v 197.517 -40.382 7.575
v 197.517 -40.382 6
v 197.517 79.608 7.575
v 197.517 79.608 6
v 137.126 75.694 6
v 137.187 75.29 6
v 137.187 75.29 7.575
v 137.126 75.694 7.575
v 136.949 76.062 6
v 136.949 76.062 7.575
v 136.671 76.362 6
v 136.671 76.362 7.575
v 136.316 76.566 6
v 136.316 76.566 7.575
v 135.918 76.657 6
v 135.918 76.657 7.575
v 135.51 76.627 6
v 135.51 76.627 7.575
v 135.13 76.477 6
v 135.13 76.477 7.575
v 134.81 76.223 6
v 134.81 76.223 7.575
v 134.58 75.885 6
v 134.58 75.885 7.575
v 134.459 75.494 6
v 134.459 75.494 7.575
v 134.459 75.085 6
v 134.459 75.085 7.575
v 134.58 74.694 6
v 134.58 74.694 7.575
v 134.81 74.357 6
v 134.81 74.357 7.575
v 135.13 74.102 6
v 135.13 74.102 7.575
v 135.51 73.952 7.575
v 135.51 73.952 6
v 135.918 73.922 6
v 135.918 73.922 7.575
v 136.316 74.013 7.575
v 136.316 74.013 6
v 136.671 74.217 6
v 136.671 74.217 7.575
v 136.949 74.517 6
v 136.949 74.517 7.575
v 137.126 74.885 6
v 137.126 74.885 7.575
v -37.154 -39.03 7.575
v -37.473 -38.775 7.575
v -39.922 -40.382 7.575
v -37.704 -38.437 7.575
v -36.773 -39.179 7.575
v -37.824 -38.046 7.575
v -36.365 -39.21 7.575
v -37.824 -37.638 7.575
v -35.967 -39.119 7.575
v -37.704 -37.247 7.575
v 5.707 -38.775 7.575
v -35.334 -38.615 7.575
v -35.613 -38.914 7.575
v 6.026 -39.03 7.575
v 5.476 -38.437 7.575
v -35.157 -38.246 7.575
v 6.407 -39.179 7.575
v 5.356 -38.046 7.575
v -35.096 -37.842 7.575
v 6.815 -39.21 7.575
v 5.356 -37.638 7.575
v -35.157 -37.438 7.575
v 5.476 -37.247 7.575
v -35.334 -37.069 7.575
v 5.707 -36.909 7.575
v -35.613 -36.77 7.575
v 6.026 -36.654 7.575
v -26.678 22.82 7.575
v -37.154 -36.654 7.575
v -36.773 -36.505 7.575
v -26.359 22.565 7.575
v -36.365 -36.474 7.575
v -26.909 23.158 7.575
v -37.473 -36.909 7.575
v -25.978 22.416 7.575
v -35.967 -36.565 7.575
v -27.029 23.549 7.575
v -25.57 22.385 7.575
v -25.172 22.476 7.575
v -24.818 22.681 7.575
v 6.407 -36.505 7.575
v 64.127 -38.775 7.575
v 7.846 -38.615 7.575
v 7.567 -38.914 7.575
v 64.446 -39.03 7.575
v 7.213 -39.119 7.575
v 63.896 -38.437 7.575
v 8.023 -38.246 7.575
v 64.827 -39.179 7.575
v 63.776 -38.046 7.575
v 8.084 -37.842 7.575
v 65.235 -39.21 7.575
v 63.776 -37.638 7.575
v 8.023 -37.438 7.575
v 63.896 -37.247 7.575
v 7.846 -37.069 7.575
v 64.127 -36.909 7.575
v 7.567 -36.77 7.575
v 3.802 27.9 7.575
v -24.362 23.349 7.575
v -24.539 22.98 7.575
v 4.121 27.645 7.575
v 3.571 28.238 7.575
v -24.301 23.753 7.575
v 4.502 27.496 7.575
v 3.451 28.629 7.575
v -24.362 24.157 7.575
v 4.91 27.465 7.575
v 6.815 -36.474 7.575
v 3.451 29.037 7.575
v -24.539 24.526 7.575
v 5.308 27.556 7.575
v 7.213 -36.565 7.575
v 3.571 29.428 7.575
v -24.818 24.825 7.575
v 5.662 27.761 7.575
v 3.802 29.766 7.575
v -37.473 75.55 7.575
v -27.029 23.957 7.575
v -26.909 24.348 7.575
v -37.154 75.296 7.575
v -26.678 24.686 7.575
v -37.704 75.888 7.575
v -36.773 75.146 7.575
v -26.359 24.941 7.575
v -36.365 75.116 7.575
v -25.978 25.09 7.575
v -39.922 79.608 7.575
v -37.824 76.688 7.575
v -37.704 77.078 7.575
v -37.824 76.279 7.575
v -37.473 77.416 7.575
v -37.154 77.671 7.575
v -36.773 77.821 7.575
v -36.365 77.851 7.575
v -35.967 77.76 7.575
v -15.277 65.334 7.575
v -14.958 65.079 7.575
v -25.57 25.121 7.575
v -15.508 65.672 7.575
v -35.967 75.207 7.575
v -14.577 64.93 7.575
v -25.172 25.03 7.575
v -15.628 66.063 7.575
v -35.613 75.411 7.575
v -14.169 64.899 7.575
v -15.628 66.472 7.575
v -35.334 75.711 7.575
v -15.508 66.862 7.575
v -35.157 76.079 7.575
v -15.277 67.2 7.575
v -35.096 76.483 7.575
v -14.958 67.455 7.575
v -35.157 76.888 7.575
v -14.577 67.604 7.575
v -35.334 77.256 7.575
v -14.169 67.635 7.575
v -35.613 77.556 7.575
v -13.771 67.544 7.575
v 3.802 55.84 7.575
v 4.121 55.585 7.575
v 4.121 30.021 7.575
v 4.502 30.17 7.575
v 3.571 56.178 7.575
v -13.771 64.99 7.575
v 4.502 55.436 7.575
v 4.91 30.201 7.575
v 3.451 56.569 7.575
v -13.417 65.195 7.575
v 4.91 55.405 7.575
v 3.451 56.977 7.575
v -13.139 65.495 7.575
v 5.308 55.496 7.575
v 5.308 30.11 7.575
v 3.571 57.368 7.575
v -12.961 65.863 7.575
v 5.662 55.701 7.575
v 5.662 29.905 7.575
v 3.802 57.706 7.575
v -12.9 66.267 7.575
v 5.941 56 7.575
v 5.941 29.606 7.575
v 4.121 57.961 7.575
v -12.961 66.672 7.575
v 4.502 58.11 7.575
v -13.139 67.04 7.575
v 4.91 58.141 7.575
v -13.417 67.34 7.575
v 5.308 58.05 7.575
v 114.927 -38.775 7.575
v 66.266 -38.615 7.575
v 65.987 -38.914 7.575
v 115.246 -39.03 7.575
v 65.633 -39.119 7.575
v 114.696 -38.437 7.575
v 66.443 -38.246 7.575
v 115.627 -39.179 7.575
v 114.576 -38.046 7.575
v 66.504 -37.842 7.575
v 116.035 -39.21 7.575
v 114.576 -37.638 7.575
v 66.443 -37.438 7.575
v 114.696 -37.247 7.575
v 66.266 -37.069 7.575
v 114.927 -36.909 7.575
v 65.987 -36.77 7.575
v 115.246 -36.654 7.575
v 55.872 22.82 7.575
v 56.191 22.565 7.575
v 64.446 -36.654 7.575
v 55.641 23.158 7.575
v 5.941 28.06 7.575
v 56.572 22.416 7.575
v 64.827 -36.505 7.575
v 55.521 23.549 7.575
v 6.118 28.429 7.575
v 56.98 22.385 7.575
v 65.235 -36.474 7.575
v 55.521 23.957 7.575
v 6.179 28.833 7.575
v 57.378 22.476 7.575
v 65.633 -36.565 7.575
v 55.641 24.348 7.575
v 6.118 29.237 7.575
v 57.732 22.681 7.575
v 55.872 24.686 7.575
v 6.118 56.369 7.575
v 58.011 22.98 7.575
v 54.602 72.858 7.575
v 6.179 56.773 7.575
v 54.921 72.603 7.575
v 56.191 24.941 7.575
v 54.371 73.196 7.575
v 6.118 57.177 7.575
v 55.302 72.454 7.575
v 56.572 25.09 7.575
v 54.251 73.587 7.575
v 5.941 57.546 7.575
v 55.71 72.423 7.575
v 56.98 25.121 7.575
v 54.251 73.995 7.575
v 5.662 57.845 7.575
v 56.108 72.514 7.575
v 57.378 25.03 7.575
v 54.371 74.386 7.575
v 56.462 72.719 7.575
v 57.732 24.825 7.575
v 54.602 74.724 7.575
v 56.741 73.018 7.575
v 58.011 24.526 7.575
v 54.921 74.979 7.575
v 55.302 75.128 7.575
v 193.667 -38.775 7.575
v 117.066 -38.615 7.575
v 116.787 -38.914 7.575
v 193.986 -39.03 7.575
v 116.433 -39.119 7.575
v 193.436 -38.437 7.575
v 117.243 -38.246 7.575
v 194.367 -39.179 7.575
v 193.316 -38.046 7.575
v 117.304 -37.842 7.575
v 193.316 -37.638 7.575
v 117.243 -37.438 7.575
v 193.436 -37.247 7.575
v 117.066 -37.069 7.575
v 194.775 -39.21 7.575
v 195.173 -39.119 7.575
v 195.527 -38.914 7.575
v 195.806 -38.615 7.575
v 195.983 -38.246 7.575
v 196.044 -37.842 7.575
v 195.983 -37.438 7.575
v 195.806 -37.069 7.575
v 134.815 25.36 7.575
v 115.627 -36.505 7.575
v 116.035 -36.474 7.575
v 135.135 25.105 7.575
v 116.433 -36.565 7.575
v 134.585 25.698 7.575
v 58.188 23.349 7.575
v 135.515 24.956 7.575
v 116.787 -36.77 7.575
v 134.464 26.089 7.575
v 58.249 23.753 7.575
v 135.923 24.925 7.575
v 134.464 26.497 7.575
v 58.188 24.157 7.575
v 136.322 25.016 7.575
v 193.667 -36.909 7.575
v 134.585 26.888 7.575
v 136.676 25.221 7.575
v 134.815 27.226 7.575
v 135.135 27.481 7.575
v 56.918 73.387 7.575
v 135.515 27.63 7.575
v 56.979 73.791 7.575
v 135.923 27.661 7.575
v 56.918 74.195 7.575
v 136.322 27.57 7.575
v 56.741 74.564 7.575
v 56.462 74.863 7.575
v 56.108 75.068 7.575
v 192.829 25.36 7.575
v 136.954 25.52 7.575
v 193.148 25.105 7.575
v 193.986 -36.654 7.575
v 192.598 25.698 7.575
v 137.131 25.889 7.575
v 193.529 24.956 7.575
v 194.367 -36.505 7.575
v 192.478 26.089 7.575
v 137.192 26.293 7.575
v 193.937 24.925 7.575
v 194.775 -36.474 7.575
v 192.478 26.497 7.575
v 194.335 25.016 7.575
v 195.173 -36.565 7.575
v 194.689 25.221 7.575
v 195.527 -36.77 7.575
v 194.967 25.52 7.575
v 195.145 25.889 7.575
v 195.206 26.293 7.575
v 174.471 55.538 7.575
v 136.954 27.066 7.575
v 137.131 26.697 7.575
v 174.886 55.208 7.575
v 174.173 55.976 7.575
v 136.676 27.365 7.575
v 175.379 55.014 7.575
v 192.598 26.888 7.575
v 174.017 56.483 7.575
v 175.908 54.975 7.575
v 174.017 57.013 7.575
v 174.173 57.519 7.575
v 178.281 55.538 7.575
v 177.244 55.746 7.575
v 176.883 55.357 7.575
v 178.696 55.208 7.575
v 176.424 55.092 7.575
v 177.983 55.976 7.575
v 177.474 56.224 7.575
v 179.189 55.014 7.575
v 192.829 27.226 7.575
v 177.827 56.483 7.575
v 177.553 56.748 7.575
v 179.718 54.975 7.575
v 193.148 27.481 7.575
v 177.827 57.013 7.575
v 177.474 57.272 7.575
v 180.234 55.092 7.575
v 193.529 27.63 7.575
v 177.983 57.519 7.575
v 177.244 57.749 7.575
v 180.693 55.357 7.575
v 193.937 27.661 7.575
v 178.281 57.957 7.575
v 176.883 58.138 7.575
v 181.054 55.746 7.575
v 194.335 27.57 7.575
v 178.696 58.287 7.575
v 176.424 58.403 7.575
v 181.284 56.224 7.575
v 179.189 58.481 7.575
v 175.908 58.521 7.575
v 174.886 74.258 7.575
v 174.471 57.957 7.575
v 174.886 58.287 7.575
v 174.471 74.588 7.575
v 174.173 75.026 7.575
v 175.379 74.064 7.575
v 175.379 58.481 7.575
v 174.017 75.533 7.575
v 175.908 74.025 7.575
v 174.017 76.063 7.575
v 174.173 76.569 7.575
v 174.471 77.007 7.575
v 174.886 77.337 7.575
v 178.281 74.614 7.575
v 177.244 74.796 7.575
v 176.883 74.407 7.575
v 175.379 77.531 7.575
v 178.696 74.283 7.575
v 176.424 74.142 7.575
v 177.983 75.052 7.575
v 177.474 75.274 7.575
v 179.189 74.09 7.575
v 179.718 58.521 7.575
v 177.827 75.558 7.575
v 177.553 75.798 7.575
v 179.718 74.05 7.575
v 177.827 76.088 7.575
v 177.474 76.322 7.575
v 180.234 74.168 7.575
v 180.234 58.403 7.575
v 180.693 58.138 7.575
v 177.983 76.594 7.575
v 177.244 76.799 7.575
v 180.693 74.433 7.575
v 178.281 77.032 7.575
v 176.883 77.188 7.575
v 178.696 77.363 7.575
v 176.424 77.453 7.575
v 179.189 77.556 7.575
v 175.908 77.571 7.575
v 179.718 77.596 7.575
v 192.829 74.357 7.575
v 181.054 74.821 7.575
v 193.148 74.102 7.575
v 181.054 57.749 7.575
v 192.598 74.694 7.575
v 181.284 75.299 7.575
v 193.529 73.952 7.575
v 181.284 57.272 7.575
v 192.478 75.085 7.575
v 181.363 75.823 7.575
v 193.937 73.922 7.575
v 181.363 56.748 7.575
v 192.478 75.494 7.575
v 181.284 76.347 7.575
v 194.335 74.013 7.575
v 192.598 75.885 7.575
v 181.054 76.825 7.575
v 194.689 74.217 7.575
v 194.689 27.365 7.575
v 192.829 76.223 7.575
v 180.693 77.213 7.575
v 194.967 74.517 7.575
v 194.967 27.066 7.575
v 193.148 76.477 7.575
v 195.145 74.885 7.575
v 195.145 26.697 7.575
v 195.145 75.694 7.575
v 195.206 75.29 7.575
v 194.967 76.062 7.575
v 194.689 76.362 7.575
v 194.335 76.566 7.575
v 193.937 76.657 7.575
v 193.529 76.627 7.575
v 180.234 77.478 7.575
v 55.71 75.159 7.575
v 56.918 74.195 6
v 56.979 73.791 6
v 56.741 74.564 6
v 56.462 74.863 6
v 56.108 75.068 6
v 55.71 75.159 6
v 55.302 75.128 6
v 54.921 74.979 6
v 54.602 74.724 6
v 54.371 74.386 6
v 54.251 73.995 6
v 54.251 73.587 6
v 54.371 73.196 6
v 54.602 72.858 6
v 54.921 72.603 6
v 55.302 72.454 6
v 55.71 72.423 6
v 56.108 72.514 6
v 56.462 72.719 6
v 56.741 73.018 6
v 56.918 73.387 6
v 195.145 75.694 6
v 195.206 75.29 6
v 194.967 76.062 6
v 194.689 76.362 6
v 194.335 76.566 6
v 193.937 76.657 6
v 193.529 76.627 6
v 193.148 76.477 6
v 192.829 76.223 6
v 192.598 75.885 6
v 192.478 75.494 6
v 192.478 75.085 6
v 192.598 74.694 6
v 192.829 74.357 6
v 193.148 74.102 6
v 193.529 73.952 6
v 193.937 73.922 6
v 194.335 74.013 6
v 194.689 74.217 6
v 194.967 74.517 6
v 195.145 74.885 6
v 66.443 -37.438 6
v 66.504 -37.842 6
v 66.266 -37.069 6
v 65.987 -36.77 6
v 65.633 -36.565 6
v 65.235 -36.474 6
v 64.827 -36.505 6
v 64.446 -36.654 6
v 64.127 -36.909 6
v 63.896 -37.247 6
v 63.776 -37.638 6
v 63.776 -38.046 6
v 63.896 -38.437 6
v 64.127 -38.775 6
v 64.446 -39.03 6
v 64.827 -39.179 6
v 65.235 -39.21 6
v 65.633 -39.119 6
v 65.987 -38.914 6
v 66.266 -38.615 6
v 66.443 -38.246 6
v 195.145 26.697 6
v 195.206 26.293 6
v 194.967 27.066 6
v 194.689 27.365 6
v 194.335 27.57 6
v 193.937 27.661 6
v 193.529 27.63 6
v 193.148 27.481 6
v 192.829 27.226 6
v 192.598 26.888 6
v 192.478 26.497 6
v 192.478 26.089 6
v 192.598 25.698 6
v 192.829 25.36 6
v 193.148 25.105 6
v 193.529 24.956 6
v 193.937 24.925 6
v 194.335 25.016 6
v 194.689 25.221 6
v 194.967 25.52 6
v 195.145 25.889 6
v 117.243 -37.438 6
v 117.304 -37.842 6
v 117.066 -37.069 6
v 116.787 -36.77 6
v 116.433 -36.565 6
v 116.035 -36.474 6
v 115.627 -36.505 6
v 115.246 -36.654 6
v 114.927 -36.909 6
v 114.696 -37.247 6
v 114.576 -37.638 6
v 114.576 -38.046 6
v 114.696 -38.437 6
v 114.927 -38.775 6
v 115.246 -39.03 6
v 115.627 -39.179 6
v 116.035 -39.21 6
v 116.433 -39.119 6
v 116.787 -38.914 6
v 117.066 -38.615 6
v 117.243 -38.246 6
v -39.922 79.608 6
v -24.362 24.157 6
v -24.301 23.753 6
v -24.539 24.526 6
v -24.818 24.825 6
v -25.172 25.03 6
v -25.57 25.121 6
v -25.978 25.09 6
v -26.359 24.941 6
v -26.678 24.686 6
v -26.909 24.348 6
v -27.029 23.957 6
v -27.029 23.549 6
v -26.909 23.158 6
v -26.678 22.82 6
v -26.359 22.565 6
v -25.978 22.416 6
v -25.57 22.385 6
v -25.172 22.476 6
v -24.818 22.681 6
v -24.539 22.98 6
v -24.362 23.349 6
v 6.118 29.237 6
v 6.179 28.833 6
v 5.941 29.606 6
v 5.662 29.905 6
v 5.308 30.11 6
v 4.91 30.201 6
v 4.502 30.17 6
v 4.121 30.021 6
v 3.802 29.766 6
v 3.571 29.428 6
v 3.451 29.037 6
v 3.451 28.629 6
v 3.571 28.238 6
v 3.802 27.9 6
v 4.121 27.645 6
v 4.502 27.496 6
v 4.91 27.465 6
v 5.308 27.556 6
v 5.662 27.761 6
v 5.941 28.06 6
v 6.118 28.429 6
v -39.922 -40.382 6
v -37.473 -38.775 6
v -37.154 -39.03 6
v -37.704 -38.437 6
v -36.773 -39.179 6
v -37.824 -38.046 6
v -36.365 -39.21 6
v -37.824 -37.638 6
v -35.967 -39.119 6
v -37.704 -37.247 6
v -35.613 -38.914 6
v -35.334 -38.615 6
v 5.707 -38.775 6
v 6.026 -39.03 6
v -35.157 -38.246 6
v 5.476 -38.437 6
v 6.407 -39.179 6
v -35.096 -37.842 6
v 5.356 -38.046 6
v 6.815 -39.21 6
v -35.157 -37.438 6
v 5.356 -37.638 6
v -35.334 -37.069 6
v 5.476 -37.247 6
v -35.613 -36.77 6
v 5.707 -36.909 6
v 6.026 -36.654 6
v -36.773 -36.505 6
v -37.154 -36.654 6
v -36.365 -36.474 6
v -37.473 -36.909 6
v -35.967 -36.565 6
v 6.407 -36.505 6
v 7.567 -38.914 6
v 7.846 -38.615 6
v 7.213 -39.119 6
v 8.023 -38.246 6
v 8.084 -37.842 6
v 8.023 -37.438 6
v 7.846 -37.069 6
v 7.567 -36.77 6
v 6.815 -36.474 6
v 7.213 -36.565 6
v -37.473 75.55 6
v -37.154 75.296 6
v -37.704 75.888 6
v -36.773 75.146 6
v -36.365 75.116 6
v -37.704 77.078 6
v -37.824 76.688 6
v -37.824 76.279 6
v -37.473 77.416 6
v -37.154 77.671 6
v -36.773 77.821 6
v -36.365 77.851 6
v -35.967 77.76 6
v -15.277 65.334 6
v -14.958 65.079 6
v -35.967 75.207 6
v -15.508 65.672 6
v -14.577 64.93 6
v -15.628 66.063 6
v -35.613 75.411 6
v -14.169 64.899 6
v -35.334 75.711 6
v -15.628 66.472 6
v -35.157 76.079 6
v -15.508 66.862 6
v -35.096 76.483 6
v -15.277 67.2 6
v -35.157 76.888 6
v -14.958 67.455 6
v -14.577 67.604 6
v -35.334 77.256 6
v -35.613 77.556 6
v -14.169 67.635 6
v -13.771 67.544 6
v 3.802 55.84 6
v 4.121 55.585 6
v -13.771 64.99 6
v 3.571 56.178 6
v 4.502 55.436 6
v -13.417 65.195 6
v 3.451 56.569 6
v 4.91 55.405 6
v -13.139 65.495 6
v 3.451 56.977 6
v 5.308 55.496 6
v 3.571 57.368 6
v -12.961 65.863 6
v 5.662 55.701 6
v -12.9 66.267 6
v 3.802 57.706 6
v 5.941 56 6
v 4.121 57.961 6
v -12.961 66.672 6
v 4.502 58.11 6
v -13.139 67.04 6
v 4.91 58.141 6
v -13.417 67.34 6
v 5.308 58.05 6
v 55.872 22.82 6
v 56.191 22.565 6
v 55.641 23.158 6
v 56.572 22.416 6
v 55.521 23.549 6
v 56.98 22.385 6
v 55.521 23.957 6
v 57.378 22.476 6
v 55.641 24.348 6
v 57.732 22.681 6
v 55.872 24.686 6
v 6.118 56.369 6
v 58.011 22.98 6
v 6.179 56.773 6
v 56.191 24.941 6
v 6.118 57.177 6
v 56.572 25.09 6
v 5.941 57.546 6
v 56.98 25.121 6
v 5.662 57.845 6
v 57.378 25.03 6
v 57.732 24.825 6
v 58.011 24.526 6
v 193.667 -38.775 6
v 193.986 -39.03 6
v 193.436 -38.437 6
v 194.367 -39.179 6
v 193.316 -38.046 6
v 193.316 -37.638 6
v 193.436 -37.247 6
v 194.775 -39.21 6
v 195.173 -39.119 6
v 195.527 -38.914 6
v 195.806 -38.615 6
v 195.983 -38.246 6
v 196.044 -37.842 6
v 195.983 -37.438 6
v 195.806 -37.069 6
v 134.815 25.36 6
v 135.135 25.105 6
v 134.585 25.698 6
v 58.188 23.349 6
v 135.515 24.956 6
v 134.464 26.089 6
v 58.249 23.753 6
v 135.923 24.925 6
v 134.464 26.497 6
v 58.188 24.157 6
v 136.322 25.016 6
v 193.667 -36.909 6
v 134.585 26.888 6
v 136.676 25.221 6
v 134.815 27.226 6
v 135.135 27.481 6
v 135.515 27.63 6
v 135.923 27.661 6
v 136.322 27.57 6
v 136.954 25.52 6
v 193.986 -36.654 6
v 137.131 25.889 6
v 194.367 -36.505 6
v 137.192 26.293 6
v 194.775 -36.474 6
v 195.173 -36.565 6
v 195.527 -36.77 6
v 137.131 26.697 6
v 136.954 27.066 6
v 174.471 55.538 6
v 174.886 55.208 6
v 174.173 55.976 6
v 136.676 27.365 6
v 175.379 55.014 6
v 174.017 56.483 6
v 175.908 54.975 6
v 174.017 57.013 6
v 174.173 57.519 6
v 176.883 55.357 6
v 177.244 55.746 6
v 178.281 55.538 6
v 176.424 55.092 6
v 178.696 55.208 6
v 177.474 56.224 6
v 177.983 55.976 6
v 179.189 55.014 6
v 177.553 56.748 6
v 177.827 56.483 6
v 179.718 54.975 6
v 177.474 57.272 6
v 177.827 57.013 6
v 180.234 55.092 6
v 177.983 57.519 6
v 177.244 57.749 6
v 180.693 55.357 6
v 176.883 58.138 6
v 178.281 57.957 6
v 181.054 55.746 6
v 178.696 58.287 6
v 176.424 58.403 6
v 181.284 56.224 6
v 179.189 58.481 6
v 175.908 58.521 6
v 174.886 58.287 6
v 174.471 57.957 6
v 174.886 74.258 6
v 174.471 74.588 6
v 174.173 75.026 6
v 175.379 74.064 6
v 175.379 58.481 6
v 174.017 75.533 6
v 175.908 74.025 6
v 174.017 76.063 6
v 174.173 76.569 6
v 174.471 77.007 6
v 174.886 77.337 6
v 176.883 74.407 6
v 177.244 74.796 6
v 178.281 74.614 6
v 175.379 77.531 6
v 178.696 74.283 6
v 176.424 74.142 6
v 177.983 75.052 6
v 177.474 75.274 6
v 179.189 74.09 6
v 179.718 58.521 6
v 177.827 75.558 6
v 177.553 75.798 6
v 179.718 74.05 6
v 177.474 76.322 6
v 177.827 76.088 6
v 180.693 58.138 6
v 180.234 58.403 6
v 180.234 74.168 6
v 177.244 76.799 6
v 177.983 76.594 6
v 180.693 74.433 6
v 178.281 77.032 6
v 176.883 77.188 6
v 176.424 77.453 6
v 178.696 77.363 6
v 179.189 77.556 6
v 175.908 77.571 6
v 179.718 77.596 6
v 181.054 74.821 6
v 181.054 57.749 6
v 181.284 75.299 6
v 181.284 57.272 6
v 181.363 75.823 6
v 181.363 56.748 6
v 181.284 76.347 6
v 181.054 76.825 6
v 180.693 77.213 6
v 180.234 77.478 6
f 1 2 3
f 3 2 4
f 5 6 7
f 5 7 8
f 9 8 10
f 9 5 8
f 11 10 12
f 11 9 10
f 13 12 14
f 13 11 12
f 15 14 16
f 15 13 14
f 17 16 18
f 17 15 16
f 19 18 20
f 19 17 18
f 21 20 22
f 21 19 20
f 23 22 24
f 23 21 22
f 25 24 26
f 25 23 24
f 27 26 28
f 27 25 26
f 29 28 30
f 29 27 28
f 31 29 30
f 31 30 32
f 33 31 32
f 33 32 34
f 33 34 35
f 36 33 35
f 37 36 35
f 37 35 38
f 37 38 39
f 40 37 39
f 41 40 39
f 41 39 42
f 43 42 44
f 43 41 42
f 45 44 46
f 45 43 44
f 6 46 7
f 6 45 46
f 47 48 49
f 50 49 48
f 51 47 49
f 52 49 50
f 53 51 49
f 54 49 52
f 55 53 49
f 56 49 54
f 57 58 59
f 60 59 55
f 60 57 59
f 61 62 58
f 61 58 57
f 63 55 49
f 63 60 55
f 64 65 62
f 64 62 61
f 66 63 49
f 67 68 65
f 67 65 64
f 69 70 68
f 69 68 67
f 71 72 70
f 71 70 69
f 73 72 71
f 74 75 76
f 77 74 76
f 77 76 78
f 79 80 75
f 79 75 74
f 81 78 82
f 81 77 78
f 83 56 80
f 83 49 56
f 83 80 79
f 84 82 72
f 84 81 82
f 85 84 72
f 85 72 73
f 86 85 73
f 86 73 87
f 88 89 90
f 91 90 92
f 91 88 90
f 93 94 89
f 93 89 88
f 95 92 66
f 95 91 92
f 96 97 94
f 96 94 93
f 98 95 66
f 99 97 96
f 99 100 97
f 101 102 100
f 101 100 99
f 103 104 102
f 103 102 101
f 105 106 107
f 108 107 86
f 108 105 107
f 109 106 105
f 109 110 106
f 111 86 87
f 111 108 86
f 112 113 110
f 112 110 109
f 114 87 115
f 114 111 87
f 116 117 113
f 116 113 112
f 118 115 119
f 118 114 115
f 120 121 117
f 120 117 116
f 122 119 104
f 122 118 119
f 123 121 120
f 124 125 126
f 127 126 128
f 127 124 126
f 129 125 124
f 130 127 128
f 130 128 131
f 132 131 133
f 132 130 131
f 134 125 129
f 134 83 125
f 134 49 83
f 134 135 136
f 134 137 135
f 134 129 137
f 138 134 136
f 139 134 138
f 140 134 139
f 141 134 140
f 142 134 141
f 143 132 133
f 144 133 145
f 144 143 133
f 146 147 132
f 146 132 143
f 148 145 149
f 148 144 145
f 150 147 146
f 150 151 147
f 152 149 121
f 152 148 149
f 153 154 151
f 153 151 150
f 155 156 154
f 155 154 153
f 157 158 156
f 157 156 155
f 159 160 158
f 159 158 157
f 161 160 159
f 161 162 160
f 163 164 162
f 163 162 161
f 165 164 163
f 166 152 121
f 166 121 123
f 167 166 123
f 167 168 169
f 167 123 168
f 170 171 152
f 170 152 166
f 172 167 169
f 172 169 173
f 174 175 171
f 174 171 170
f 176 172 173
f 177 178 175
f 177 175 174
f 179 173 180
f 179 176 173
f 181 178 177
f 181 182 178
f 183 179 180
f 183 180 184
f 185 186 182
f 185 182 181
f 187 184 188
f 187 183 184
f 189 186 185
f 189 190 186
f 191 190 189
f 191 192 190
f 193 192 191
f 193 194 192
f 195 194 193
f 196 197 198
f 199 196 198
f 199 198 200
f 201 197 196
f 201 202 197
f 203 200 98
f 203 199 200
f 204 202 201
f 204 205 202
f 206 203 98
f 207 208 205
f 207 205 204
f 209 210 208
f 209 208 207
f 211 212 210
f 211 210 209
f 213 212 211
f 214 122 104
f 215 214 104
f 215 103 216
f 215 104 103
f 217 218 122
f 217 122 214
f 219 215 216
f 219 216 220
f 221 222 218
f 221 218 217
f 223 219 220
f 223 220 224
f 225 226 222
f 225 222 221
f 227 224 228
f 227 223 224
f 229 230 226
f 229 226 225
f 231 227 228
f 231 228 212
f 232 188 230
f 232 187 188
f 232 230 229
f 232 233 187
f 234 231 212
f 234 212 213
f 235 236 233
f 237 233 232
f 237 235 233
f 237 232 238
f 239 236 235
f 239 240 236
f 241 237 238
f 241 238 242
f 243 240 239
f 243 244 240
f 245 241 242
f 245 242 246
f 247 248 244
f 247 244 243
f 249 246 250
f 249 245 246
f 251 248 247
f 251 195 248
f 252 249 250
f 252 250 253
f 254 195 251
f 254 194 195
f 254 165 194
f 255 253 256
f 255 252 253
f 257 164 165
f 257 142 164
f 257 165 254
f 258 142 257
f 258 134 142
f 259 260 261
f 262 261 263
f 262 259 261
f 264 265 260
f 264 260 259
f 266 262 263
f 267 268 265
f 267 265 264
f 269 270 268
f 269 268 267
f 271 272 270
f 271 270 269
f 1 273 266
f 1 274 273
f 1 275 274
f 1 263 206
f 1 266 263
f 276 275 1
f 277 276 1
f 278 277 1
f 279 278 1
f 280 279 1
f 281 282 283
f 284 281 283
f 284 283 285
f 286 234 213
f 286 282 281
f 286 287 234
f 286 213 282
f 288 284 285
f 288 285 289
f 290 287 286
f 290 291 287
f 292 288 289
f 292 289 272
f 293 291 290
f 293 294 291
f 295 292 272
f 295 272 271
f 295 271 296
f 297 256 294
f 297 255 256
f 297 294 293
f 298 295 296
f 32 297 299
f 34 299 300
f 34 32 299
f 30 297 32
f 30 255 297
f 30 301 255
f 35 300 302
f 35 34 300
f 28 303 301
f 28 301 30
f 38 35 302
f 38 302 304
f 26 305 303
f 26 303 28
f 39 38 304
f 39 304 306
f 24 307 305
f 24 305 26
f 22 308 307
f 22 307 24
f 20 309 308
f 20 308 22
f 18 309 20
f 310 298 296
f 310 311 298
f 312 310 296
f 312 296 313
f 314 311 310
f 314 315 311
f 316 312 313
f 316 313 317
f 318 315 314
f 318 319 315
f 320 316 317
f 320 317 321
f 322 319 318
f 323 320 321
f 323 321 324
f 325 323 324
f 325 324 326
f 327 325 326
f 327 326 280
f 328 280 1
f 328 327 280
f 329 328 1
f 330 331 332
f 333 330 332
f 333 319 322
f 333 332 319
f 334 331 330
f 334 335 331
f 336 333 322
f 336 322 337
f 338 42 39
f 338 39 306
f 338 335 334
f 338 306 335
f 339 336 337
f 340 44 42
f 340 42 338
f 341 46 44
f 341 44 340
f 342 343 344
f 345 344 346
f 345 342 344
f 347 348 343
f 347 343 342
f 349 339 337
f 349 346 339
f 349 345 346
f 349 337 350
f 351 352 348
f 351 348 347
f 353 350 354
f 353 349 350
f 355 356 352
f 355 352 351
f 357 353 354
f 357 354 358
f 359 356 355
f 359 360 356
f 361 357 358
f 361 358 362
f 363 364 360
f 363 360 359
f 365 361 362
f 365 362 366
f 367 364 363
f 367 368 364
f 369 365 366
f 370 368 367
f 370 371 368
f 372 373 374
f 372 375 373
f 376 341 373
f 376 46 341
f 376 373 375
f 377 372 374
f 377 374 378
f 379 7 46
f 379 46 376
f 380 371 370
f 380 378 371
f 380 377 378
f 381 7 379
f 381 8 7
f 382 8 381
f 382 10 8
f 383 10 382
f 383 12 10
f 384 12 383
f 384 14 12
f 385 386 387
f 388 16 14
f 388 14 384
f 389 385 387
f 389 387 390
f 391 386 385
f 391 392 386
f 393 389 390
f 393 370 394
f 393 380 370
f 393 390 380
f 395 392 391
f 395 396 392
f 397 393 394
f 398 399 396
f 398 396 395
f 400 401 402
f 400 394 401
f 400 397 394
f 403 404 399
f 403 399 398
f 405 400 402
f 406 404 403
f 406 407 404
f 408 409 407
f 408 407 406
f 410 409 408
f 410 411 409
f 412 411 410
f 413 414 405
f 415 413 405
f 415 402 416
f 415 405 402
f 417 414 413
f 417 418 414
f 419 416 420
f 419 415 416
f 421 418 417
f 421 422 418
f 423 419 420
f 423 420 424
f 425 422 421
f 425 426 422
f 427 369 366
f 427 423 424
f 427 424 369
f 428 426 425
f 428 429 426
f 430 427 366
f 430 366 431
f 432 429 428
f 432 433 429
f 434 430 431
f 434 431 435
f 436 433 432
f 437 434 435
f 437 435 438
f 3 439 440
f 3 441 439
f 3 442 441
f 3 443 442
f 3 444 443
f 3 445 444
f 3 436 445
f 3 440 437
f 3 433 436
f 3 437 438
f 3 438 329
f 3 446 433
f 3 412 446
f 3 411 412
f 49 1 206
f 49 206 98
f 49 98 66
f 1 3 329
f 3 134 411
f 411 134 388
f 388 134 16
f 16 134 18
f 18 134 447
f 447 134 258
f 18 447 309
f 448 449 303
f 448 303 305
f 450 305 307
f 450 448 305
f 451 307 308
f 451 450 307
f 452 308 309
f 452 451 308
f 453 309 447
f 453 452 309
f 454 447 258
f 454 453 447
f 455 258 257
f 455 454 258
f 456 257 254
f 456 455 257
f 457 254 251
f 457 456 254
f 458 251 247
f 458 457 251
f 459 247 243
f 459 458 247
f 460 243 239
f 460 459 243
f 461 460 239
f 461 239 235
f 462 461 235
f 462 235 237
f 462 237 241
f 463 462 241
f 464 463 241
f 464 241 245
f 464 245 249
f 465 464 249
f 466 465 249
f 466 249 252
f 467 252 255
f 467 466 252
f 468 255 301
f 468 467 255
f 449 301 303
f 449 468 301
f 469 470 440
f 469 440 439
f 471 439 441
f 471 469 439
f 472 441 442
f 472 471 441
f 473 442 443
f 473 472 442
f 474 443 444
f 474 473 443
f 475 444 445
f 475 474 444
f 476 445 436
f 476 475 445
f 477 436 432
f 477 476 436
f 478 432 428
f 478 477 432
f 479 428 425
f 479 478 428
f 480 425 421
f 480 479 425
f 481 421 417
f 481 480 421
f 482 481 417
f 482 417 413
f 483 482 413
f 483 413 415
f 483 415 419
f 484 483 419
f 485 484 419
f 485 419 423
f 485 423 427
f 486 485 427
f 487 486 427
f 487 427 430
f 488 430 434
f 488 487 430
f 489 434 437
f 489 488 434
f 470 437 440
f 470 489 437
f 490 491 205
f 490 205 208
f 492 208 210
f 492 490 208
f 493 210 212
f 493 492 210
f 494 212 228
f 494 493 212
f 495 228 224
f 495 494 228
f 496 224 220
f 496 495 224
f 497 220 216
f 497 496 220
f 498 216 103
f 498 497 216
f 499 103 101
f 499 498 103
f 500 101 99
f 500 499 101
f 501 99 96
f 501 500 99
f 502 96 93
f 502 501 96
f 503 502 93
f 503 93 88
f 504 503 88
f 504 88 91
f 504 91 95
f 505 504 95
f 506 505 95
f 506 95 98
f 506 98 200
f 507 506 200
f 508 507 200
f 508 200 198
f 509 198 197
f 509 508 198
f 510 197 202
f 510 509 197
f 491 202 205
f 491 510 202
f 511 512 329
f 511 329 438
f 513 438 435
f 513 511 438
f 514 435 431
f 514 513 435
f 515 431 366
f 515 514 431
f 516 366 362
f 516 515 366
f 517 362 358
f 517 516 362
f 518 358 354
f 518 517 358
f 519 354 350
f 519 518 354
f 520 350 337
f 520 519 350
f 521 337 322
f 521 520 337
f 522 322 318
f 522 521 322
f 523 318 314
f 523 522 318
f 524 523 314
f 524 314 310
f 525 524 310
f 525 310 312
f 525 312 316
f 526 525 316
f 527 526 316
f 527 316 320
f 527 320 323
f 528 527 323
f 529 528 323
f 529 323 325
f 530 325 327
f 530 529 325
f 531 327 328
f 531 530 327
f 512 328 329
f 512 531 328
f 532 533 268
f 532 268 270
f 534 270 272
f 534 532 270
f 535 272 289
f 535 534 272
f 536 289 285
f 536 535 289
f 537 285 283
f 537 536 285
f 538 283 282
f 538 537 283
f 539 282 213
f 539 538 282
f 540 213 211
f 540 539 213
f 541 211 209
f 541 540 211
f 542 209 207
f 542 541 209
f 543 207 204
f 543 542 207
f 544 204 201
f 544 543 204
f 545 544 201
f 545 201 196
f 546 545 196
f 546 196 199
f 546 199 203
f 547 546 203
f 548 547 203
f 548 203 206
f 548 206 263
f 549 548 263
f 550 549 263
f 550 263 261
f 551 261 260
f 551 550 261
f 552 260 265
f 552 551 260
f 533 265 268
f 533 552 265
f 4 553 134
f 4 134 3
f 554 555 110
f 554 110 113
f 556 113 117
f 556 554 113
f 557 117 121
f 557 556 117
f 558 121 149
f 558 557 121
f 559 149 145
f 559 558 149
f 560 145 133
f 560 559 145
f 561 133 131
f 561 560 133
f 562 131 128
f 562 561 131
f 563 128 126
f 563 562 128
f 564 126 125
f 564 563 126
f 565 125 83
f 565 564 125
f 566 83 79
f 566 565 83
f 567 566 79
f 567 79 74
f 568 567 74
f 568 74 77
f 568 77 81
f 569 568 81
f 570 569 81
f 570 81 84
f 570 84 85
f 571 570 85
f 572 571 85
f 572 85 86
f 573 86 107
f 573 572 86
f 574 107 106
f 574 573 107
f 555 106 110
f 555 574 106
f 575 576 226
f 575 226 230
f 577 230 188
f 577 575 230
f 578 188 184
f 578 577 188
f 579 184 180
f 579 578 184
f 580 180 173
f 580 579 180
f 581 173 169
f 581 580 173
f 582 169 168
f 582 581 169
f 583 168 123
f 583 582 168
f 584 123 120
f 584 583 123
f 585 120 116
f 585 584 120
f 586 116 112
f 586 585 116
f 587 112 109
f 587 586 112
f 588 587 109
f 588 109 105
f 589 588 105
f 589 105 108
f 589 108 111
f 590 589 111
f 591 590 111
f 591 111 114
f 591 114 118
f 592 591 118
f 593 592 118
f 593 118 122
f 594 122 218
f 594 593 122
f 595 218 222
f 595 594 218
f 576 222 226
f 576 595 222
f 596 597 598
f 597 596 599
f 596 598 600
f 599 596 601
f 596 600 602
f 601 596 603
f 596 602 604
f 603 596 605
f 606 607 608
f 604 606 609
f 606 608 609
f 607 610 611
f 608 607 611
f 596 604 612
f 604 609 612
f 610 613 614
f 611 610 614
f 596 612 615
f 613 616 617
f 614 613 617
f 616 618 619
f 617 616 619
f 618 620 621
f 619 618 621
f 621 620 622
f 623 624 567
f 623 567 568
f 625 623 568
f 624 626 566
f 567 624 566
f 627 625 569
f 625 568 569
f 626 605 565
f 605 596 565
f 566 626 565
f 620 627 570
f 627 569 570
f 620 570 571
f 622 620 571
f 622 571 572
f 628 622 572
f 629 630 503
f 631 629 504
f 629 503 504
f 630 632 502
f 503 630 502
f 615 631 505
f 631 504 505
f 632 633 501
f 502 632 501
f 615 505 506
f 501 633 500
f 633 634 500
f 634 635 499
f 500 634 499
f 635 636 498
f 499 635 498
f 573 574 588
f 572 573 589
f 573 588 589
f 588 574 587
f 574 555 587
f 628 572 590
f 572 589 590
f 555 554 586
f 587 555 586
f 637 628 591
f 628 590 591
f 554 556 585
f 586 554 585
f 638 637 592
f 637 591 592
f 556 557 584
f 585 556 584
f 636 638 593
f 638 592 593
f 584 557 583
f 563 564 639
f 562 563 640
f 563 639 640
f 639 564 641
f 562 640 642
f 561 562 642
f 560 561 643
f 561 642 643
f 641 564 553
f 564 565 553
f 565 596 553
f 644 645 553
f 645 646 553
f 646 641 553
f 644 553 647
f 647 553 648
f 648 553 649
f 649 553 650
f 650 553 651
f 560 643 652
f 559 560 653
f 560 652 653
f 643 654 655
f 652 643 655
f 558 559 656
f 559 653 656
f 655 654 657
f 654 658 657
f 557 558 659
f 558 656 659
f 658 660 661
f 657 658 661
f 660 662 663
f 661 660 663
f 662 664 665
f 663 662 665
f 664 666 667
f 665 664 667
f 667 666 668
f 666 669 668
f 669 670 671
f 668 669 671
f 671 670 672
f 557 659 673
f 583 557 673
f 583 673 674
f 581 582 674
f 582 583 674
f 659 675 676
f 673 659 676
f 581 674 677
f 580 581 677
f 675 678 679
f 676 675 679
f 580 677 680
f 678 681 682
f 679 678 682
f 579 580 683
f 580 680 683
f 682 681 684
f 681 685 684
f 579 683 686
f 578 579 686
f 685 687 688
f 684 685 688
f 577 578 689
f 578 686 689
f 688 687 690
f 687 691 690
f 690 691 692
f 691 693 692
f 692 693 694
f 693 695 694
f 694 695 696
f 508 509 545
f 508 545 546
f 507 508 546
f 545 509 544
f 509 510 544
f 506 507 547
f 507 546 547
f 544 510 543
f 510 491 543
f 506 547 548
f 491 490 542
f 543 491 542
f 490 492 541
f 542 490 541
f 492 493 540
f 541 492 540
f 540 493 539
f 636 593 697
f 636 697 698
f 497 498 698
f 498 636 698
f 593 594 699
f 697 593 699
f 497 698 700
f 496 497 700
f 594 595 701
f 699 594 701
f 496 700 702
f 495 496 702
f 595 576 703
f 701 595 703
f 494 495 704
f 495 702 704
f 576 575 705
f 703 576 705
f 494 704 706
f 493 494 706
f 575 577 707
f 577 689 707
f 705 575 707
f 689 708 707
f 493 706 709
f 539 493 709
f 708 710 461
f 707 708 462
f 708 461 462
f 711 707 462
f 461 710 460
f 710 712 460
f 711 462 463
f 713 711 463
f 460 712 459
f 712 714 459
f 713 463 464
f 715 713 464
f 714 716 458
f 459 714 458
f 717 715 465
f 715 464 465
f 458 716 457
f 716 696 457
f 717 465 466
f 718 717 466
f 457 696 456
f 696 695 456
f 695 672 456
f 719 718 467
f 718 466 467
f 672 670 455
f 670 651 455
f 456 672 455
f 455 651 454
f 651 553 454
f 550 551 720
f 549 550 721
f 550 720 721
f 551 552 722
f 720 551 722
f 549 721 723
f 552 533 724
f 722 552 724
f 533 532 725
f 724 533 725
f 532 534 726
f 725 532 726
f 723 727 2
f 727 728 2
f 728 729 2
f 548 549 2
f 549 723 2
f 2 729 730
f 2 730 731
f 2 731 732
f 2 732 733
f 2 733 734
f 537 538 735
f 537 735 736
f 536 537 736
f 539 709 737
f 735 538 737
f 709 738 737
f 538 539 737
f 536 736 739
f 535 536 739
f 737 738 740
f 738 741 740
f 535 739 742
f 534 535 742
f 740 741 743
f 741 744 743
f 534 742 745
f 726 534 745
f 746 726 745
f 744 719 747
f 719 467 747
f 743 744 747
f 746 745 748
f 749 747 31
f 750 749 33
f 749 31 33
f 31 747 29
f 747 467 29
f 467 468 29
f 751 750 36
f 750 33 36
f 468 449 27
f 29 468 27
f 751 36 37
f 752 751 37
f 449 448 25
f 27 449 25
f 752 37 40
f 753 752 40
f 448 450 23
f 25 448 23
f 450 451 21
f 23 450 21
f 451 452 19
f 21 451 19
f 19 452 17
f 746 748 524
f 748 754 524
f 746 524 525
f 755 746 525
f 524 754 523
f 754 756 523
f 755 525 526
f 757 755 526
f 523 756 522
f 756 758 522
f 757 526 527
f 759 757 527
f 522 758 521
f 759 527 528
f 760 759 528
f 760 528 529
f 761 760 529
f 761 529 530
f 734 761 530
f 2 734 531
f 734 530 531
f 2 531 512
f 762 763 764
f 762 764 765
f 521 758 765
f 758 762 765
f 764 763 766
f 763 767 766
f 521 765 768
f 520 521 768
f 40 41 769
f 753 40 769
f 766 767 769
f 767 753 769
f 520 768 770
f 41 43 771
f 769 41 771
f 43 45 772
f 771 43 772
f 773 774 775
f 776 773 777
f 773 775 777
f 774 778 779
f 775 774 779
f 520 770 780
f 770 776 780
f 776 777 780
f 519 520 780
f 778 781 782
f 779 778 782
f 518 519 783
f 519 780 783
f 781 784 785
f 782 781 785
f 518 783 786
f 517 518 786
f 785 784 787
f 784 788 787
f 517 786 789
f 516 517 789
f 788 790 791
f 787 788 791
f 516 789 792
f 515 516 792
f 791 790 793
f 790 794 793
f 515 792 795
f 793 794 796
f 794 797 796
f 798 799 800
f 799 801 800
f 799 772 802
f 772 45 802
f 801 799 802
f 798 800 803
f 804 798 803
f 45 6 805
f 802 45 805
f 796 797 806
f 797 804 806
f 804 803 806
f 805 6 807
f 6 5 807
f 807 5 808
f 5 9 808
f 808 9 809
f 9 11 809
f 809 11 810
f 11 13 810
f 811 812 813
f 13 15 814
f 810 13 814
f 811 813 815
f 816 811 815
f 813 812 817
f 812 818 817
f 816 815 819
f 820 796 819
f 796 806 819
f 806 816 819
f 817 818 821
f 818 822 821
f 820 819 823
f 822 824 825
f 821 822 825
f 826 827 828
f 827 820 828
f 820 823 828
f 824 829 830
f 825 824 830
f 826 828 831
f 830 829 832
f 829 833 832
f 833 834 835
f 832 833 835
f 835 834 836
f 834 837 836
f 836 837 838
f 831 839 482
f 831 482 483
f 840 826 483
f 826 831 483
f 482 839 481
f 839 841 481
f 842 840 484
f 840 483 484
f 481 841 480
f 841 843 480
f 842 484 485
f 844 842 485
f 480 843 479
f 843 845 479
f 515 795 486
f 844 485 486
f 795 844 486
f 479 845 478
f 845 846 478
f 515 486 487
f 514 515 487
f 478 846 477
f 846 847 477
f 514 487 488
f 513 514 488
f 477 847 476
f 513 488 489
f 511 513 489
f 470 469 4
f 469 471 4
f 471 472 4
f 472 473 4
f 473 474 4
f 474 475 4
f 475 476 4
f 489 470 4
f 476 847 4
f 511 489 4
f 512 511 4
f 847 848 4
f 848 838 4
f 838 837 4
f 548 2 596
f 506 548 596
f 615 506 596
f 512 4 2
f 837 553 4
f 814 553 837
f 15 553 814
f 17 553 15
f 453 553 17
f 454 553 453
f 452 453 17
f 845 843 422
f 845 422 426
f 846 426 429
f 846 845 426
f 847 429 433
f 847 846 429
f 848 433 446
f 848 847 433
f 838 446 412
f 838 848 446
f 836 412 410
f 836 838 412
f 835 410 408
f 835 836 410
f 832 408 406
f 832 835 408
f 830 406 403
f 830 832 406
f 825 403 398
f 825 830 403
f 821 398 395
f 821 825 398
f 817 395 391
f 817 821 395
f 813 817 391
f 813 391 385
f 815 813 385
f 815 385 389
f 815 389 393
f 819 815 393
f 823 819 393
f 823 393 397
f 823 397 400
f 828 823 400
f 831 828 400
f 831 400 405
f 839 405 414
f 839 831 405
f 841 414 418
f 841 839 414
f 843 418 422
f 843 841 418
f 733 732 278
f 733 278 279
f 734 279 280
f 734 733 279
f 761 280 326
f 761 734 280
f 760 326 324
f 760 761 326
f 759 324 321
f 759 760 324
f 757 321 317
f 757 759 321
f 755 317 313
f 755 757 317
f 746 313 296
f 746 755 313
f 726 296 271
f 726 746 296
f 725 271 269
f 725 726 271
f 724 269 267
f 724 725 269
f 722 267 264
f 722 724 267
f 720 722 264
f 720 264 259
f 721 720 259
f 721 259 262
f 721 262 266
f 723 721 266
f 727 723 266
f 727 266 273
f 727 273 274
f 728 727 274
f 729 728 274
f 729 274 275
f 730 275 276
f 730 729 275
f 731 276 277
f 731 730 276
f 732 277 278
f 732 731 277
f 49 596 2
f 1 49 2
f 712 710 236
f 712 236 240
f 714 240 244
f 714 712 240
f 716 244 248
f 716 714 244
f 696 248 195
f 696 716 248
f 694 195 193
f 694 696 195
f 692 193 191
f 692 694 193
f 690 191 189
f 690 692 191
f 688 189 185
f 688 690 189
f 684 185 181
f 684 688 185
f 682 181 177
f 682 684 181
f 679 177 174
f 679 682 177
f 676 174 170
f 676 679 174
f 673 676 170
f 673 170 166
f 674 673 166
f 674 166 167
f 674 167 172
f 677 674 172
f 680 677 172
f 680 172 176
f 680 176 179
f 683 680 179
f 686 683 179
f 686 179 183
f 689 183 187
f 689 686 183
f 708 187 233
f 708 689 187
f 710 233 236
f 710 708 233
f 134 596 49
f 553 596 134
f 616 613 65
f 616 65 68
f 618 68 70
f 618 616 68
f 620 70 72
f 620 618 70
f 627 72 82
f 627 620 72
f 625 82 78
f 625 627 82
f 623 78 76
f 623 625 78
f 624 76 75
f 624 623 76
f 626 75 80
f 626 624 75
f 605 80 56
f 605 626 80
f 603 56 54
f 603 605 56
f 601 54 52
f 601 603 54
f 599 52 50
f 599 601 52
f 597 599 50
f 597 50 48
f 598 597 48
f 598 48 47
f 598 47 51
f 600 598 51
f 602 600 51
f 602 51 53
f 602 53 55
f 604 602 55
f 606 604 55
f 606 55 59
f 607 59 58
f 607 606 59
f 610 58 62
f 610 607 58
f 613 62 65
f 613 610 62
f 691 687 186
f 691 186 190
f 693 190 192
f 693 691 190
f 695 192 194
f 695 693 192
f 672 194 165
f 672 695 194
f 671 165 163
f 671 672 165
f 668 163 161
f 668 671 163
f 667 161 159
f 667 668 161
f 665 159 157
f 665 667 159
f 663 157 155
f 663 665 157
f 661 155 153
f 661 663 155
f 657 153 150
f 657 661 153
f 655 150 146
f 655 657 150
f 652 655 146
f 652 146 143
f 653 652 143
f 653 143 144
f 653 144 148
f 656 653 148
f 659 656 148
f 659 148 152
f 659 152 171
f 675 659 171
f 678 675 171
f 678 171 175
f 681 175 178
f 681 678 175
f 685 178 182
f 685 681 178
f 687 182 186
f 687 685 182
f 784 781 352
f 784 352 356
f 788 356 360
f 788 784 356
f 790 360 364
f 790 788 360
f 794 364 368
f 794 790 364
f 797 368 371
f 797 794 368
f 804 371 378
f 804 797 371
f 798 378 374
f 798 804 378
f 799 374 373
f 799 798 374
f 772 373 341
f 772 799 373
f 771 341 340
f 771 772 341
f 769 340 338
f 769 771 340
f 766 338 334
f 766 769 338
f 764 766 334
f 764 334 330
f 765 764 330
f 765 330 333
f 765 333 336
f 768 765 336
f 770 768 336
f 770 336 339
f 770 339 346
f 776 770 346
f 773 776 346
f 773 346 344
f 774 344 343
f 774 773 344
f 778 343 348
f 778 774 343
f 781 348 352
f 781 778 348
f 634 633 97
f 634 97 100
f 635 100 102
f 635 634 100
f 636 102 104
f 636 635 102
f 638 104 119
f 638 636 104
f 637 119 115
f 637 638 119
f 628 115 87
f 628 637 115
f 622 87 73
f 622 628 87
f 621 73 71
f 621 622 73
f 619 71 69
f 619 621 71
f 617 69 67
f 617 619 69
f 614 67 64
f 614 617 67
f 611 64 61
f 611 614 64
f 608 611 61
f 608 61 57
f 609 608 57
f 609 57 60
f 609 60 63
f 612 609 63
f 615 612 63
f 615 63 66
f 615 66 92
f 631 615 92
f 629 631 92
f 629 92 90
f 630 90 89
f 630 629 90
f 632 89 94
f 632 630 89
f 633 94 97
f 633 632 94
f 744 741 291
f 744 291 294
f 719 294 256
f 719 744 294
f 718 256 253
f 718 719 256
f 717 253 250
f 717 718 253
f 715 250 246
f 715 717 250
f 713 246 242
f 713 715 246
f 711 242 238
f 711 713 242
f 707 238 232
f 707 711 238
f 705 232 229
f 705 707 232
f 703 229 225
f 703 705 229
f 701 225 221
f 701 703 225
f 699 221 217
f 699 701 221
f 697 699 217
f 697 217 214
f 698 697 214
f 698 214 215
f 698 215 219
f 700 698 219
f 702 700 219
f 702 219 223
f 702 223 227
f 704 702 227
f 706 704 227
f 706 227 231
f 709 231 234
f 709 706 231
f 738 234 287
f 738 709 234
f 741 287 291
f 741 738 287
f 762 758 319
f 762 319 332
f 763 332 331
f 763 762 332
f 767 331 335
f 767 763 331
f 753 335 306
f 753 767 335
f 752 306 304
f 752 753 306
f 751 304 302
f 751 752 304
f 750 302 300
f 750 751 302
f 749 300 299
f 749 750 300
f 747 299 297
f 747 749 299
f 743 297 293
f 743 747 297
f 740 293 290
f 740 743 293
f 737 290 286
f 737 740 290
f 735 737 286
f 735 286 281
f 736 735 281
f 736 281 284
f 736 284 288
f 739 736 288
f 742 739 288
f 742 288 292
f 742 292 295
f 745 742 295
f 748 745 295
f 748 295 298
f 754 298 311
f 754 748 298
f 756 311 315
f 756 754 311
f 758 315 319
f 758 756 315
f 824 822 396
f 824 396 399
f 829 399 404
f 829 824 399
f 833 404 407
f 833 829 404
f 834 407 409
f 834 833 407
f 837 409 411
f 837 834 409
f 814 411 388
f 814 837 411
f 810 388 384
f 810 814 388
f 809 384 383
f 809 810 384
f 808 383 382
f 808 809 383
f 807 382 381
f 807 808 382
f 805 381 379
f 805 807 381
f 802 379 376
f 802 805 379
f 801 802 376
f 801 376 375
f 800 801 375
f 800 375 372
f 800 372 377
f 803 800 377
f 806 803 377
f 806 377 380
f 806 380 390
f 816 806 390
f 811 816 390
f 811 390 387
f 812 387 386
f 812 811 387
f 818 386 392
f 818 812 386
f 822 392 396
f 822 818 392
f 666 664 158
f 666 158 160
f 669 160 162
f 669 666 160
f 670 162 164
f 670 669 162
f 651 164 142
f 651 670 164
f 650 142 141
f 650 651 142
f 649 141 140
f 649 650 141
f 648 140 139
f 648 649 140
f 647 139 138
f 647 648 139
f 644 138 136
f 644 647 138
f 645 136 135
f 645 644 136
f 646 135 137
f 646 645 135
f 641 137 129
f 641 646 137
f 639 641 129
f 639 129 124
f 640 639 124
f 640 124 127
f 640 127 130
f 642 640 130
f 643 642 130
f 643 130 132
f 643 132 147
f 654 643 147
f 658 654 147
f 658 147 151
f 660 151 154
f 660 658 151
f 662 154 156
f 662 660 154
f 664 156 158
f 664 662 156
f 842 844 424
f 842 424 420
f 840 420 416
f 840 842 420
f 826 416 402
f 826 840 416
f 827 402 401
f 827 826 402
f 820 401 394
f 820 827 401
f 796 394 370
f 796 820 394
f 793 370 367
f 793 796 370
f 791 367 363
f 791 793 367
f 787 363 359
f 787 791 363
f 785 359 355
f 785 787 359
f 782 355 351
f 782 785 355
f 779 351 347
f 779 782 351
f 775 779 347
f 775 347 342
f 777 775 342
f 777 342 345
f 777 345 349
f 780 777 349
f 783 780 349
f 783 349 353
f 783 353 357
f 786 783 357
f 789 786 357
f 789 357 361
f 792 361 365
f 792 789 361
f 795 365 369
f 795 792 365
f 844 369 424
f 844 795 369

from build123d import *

# Parameters (mm, degrees)
BOSS_EXTRUDE1_START = 6
SKETCH1_W           = 237.4392
SKETCH1_H           = 119.9896
SKETCH1_R           = 1.3716
SKETCH1_R_2         = 1.778
BOSS_EXTRUDE1_DEPTH = 1.5748


with BuildPart() as part:
    # Sketch1 → Boss-Extrude1 (new body)
    with BuildSketch(Plane.XY.offset(BOSS_EXTRUDE1_START)):
        with Locations((78.797443137, 19.612784314)):
            Rectangle(SKETCH1_W, SKETCH1_H)
        with Locations((193.834043137, 75.289584314)):
            Circle(SKETCH1_R, mode=Mode.SUBTRACT)
        with Locations((135.815363137, 75.289584314)):
            Circle(SKETCH1_R, mode=Mode.SUBTRACT)
        with Locations((193.834043137, 26.292984314)):
            Circle(SKETCH1_R, mode=Mode.SUBTRACT)
        with Locations((135.820443137, 26.292984314)):
            Circle(SKETCH1_R, mode=Mode.SUBTRACT)
        with Locations((194.672243137, -37.842015686)):
            Circle(SKETCH1_R, mode=Mode.SUBTRACT)
        with Locations((115.932243137, -37.842015686)):
            Circle(SKETCH1_R, mode=Mode.SUBTRACT)
        with Locations((55.607243137, 73.790984314)):
            Circle(SKETCH1_R, mode=Mode.SUBTRACT)
        with Locations((56.877243137, 23.752984314)):
            Circle(SKETCH1_R, mode=Mode.SUBTRACT)
        with Locations((65.132243137, -37.842015686)):
            Circle(SKETCH1_R, mode=Mode.SUBTRACT)
        with Locations((4.807243137, 56.772984314)):
            Circle(SKETCH1_R, mode=Mode.SUBTRACT)
        with Locations((4.807243137, 28.832984314)):
            Circle(SKETCH1_R, mode=Mode.SUBTRACT)
        with Locations((6.712243137, -37.842015686)):
            Circle(SKETCH1_R, mode=Mode.SUBTRACT)
        with Locations((-14.271778871, 66.267235766)):
            Circle(SKETCH1_R, mode=Mode.SUBTRACT)
        with Locations((-36.467756863, 76.483384314)):
            Circle(SKETCH1_R, mode=Mode.SUBTRACT)
        with Locations((-25.672756863, 23.752984314)):
            Circle(SKETCH1_R, mode=Mode.SUBTRACT)
        with Locations((-36.467756863, -37.842015686)):
            Circle(SKETCH1_R, mode=Mode.SUBTRACT)
        with Locations((179.584643137, 75.822984314)):
            Circle(SKETCH1_R_2, mode=Mode.SUBTRACT)
        with Locations((175.774643137, 75.797584314)):
            Circle(SKETCH1_R_2, mode=Mode.SUBTRACT)
        with Locations((179.584643137, 56.747584314)):
            Circle(SKETCH1_R_2, mode=Mode.SUBTRACT)
        with Locations((175.774643137, 56.747584314)):
            Circle(SKETCH1_R_2, mode=Mode.SUBTRACT)
    extrude(amount=BOSS_EXTRUDE1_DEPTH)


solid = part.part
